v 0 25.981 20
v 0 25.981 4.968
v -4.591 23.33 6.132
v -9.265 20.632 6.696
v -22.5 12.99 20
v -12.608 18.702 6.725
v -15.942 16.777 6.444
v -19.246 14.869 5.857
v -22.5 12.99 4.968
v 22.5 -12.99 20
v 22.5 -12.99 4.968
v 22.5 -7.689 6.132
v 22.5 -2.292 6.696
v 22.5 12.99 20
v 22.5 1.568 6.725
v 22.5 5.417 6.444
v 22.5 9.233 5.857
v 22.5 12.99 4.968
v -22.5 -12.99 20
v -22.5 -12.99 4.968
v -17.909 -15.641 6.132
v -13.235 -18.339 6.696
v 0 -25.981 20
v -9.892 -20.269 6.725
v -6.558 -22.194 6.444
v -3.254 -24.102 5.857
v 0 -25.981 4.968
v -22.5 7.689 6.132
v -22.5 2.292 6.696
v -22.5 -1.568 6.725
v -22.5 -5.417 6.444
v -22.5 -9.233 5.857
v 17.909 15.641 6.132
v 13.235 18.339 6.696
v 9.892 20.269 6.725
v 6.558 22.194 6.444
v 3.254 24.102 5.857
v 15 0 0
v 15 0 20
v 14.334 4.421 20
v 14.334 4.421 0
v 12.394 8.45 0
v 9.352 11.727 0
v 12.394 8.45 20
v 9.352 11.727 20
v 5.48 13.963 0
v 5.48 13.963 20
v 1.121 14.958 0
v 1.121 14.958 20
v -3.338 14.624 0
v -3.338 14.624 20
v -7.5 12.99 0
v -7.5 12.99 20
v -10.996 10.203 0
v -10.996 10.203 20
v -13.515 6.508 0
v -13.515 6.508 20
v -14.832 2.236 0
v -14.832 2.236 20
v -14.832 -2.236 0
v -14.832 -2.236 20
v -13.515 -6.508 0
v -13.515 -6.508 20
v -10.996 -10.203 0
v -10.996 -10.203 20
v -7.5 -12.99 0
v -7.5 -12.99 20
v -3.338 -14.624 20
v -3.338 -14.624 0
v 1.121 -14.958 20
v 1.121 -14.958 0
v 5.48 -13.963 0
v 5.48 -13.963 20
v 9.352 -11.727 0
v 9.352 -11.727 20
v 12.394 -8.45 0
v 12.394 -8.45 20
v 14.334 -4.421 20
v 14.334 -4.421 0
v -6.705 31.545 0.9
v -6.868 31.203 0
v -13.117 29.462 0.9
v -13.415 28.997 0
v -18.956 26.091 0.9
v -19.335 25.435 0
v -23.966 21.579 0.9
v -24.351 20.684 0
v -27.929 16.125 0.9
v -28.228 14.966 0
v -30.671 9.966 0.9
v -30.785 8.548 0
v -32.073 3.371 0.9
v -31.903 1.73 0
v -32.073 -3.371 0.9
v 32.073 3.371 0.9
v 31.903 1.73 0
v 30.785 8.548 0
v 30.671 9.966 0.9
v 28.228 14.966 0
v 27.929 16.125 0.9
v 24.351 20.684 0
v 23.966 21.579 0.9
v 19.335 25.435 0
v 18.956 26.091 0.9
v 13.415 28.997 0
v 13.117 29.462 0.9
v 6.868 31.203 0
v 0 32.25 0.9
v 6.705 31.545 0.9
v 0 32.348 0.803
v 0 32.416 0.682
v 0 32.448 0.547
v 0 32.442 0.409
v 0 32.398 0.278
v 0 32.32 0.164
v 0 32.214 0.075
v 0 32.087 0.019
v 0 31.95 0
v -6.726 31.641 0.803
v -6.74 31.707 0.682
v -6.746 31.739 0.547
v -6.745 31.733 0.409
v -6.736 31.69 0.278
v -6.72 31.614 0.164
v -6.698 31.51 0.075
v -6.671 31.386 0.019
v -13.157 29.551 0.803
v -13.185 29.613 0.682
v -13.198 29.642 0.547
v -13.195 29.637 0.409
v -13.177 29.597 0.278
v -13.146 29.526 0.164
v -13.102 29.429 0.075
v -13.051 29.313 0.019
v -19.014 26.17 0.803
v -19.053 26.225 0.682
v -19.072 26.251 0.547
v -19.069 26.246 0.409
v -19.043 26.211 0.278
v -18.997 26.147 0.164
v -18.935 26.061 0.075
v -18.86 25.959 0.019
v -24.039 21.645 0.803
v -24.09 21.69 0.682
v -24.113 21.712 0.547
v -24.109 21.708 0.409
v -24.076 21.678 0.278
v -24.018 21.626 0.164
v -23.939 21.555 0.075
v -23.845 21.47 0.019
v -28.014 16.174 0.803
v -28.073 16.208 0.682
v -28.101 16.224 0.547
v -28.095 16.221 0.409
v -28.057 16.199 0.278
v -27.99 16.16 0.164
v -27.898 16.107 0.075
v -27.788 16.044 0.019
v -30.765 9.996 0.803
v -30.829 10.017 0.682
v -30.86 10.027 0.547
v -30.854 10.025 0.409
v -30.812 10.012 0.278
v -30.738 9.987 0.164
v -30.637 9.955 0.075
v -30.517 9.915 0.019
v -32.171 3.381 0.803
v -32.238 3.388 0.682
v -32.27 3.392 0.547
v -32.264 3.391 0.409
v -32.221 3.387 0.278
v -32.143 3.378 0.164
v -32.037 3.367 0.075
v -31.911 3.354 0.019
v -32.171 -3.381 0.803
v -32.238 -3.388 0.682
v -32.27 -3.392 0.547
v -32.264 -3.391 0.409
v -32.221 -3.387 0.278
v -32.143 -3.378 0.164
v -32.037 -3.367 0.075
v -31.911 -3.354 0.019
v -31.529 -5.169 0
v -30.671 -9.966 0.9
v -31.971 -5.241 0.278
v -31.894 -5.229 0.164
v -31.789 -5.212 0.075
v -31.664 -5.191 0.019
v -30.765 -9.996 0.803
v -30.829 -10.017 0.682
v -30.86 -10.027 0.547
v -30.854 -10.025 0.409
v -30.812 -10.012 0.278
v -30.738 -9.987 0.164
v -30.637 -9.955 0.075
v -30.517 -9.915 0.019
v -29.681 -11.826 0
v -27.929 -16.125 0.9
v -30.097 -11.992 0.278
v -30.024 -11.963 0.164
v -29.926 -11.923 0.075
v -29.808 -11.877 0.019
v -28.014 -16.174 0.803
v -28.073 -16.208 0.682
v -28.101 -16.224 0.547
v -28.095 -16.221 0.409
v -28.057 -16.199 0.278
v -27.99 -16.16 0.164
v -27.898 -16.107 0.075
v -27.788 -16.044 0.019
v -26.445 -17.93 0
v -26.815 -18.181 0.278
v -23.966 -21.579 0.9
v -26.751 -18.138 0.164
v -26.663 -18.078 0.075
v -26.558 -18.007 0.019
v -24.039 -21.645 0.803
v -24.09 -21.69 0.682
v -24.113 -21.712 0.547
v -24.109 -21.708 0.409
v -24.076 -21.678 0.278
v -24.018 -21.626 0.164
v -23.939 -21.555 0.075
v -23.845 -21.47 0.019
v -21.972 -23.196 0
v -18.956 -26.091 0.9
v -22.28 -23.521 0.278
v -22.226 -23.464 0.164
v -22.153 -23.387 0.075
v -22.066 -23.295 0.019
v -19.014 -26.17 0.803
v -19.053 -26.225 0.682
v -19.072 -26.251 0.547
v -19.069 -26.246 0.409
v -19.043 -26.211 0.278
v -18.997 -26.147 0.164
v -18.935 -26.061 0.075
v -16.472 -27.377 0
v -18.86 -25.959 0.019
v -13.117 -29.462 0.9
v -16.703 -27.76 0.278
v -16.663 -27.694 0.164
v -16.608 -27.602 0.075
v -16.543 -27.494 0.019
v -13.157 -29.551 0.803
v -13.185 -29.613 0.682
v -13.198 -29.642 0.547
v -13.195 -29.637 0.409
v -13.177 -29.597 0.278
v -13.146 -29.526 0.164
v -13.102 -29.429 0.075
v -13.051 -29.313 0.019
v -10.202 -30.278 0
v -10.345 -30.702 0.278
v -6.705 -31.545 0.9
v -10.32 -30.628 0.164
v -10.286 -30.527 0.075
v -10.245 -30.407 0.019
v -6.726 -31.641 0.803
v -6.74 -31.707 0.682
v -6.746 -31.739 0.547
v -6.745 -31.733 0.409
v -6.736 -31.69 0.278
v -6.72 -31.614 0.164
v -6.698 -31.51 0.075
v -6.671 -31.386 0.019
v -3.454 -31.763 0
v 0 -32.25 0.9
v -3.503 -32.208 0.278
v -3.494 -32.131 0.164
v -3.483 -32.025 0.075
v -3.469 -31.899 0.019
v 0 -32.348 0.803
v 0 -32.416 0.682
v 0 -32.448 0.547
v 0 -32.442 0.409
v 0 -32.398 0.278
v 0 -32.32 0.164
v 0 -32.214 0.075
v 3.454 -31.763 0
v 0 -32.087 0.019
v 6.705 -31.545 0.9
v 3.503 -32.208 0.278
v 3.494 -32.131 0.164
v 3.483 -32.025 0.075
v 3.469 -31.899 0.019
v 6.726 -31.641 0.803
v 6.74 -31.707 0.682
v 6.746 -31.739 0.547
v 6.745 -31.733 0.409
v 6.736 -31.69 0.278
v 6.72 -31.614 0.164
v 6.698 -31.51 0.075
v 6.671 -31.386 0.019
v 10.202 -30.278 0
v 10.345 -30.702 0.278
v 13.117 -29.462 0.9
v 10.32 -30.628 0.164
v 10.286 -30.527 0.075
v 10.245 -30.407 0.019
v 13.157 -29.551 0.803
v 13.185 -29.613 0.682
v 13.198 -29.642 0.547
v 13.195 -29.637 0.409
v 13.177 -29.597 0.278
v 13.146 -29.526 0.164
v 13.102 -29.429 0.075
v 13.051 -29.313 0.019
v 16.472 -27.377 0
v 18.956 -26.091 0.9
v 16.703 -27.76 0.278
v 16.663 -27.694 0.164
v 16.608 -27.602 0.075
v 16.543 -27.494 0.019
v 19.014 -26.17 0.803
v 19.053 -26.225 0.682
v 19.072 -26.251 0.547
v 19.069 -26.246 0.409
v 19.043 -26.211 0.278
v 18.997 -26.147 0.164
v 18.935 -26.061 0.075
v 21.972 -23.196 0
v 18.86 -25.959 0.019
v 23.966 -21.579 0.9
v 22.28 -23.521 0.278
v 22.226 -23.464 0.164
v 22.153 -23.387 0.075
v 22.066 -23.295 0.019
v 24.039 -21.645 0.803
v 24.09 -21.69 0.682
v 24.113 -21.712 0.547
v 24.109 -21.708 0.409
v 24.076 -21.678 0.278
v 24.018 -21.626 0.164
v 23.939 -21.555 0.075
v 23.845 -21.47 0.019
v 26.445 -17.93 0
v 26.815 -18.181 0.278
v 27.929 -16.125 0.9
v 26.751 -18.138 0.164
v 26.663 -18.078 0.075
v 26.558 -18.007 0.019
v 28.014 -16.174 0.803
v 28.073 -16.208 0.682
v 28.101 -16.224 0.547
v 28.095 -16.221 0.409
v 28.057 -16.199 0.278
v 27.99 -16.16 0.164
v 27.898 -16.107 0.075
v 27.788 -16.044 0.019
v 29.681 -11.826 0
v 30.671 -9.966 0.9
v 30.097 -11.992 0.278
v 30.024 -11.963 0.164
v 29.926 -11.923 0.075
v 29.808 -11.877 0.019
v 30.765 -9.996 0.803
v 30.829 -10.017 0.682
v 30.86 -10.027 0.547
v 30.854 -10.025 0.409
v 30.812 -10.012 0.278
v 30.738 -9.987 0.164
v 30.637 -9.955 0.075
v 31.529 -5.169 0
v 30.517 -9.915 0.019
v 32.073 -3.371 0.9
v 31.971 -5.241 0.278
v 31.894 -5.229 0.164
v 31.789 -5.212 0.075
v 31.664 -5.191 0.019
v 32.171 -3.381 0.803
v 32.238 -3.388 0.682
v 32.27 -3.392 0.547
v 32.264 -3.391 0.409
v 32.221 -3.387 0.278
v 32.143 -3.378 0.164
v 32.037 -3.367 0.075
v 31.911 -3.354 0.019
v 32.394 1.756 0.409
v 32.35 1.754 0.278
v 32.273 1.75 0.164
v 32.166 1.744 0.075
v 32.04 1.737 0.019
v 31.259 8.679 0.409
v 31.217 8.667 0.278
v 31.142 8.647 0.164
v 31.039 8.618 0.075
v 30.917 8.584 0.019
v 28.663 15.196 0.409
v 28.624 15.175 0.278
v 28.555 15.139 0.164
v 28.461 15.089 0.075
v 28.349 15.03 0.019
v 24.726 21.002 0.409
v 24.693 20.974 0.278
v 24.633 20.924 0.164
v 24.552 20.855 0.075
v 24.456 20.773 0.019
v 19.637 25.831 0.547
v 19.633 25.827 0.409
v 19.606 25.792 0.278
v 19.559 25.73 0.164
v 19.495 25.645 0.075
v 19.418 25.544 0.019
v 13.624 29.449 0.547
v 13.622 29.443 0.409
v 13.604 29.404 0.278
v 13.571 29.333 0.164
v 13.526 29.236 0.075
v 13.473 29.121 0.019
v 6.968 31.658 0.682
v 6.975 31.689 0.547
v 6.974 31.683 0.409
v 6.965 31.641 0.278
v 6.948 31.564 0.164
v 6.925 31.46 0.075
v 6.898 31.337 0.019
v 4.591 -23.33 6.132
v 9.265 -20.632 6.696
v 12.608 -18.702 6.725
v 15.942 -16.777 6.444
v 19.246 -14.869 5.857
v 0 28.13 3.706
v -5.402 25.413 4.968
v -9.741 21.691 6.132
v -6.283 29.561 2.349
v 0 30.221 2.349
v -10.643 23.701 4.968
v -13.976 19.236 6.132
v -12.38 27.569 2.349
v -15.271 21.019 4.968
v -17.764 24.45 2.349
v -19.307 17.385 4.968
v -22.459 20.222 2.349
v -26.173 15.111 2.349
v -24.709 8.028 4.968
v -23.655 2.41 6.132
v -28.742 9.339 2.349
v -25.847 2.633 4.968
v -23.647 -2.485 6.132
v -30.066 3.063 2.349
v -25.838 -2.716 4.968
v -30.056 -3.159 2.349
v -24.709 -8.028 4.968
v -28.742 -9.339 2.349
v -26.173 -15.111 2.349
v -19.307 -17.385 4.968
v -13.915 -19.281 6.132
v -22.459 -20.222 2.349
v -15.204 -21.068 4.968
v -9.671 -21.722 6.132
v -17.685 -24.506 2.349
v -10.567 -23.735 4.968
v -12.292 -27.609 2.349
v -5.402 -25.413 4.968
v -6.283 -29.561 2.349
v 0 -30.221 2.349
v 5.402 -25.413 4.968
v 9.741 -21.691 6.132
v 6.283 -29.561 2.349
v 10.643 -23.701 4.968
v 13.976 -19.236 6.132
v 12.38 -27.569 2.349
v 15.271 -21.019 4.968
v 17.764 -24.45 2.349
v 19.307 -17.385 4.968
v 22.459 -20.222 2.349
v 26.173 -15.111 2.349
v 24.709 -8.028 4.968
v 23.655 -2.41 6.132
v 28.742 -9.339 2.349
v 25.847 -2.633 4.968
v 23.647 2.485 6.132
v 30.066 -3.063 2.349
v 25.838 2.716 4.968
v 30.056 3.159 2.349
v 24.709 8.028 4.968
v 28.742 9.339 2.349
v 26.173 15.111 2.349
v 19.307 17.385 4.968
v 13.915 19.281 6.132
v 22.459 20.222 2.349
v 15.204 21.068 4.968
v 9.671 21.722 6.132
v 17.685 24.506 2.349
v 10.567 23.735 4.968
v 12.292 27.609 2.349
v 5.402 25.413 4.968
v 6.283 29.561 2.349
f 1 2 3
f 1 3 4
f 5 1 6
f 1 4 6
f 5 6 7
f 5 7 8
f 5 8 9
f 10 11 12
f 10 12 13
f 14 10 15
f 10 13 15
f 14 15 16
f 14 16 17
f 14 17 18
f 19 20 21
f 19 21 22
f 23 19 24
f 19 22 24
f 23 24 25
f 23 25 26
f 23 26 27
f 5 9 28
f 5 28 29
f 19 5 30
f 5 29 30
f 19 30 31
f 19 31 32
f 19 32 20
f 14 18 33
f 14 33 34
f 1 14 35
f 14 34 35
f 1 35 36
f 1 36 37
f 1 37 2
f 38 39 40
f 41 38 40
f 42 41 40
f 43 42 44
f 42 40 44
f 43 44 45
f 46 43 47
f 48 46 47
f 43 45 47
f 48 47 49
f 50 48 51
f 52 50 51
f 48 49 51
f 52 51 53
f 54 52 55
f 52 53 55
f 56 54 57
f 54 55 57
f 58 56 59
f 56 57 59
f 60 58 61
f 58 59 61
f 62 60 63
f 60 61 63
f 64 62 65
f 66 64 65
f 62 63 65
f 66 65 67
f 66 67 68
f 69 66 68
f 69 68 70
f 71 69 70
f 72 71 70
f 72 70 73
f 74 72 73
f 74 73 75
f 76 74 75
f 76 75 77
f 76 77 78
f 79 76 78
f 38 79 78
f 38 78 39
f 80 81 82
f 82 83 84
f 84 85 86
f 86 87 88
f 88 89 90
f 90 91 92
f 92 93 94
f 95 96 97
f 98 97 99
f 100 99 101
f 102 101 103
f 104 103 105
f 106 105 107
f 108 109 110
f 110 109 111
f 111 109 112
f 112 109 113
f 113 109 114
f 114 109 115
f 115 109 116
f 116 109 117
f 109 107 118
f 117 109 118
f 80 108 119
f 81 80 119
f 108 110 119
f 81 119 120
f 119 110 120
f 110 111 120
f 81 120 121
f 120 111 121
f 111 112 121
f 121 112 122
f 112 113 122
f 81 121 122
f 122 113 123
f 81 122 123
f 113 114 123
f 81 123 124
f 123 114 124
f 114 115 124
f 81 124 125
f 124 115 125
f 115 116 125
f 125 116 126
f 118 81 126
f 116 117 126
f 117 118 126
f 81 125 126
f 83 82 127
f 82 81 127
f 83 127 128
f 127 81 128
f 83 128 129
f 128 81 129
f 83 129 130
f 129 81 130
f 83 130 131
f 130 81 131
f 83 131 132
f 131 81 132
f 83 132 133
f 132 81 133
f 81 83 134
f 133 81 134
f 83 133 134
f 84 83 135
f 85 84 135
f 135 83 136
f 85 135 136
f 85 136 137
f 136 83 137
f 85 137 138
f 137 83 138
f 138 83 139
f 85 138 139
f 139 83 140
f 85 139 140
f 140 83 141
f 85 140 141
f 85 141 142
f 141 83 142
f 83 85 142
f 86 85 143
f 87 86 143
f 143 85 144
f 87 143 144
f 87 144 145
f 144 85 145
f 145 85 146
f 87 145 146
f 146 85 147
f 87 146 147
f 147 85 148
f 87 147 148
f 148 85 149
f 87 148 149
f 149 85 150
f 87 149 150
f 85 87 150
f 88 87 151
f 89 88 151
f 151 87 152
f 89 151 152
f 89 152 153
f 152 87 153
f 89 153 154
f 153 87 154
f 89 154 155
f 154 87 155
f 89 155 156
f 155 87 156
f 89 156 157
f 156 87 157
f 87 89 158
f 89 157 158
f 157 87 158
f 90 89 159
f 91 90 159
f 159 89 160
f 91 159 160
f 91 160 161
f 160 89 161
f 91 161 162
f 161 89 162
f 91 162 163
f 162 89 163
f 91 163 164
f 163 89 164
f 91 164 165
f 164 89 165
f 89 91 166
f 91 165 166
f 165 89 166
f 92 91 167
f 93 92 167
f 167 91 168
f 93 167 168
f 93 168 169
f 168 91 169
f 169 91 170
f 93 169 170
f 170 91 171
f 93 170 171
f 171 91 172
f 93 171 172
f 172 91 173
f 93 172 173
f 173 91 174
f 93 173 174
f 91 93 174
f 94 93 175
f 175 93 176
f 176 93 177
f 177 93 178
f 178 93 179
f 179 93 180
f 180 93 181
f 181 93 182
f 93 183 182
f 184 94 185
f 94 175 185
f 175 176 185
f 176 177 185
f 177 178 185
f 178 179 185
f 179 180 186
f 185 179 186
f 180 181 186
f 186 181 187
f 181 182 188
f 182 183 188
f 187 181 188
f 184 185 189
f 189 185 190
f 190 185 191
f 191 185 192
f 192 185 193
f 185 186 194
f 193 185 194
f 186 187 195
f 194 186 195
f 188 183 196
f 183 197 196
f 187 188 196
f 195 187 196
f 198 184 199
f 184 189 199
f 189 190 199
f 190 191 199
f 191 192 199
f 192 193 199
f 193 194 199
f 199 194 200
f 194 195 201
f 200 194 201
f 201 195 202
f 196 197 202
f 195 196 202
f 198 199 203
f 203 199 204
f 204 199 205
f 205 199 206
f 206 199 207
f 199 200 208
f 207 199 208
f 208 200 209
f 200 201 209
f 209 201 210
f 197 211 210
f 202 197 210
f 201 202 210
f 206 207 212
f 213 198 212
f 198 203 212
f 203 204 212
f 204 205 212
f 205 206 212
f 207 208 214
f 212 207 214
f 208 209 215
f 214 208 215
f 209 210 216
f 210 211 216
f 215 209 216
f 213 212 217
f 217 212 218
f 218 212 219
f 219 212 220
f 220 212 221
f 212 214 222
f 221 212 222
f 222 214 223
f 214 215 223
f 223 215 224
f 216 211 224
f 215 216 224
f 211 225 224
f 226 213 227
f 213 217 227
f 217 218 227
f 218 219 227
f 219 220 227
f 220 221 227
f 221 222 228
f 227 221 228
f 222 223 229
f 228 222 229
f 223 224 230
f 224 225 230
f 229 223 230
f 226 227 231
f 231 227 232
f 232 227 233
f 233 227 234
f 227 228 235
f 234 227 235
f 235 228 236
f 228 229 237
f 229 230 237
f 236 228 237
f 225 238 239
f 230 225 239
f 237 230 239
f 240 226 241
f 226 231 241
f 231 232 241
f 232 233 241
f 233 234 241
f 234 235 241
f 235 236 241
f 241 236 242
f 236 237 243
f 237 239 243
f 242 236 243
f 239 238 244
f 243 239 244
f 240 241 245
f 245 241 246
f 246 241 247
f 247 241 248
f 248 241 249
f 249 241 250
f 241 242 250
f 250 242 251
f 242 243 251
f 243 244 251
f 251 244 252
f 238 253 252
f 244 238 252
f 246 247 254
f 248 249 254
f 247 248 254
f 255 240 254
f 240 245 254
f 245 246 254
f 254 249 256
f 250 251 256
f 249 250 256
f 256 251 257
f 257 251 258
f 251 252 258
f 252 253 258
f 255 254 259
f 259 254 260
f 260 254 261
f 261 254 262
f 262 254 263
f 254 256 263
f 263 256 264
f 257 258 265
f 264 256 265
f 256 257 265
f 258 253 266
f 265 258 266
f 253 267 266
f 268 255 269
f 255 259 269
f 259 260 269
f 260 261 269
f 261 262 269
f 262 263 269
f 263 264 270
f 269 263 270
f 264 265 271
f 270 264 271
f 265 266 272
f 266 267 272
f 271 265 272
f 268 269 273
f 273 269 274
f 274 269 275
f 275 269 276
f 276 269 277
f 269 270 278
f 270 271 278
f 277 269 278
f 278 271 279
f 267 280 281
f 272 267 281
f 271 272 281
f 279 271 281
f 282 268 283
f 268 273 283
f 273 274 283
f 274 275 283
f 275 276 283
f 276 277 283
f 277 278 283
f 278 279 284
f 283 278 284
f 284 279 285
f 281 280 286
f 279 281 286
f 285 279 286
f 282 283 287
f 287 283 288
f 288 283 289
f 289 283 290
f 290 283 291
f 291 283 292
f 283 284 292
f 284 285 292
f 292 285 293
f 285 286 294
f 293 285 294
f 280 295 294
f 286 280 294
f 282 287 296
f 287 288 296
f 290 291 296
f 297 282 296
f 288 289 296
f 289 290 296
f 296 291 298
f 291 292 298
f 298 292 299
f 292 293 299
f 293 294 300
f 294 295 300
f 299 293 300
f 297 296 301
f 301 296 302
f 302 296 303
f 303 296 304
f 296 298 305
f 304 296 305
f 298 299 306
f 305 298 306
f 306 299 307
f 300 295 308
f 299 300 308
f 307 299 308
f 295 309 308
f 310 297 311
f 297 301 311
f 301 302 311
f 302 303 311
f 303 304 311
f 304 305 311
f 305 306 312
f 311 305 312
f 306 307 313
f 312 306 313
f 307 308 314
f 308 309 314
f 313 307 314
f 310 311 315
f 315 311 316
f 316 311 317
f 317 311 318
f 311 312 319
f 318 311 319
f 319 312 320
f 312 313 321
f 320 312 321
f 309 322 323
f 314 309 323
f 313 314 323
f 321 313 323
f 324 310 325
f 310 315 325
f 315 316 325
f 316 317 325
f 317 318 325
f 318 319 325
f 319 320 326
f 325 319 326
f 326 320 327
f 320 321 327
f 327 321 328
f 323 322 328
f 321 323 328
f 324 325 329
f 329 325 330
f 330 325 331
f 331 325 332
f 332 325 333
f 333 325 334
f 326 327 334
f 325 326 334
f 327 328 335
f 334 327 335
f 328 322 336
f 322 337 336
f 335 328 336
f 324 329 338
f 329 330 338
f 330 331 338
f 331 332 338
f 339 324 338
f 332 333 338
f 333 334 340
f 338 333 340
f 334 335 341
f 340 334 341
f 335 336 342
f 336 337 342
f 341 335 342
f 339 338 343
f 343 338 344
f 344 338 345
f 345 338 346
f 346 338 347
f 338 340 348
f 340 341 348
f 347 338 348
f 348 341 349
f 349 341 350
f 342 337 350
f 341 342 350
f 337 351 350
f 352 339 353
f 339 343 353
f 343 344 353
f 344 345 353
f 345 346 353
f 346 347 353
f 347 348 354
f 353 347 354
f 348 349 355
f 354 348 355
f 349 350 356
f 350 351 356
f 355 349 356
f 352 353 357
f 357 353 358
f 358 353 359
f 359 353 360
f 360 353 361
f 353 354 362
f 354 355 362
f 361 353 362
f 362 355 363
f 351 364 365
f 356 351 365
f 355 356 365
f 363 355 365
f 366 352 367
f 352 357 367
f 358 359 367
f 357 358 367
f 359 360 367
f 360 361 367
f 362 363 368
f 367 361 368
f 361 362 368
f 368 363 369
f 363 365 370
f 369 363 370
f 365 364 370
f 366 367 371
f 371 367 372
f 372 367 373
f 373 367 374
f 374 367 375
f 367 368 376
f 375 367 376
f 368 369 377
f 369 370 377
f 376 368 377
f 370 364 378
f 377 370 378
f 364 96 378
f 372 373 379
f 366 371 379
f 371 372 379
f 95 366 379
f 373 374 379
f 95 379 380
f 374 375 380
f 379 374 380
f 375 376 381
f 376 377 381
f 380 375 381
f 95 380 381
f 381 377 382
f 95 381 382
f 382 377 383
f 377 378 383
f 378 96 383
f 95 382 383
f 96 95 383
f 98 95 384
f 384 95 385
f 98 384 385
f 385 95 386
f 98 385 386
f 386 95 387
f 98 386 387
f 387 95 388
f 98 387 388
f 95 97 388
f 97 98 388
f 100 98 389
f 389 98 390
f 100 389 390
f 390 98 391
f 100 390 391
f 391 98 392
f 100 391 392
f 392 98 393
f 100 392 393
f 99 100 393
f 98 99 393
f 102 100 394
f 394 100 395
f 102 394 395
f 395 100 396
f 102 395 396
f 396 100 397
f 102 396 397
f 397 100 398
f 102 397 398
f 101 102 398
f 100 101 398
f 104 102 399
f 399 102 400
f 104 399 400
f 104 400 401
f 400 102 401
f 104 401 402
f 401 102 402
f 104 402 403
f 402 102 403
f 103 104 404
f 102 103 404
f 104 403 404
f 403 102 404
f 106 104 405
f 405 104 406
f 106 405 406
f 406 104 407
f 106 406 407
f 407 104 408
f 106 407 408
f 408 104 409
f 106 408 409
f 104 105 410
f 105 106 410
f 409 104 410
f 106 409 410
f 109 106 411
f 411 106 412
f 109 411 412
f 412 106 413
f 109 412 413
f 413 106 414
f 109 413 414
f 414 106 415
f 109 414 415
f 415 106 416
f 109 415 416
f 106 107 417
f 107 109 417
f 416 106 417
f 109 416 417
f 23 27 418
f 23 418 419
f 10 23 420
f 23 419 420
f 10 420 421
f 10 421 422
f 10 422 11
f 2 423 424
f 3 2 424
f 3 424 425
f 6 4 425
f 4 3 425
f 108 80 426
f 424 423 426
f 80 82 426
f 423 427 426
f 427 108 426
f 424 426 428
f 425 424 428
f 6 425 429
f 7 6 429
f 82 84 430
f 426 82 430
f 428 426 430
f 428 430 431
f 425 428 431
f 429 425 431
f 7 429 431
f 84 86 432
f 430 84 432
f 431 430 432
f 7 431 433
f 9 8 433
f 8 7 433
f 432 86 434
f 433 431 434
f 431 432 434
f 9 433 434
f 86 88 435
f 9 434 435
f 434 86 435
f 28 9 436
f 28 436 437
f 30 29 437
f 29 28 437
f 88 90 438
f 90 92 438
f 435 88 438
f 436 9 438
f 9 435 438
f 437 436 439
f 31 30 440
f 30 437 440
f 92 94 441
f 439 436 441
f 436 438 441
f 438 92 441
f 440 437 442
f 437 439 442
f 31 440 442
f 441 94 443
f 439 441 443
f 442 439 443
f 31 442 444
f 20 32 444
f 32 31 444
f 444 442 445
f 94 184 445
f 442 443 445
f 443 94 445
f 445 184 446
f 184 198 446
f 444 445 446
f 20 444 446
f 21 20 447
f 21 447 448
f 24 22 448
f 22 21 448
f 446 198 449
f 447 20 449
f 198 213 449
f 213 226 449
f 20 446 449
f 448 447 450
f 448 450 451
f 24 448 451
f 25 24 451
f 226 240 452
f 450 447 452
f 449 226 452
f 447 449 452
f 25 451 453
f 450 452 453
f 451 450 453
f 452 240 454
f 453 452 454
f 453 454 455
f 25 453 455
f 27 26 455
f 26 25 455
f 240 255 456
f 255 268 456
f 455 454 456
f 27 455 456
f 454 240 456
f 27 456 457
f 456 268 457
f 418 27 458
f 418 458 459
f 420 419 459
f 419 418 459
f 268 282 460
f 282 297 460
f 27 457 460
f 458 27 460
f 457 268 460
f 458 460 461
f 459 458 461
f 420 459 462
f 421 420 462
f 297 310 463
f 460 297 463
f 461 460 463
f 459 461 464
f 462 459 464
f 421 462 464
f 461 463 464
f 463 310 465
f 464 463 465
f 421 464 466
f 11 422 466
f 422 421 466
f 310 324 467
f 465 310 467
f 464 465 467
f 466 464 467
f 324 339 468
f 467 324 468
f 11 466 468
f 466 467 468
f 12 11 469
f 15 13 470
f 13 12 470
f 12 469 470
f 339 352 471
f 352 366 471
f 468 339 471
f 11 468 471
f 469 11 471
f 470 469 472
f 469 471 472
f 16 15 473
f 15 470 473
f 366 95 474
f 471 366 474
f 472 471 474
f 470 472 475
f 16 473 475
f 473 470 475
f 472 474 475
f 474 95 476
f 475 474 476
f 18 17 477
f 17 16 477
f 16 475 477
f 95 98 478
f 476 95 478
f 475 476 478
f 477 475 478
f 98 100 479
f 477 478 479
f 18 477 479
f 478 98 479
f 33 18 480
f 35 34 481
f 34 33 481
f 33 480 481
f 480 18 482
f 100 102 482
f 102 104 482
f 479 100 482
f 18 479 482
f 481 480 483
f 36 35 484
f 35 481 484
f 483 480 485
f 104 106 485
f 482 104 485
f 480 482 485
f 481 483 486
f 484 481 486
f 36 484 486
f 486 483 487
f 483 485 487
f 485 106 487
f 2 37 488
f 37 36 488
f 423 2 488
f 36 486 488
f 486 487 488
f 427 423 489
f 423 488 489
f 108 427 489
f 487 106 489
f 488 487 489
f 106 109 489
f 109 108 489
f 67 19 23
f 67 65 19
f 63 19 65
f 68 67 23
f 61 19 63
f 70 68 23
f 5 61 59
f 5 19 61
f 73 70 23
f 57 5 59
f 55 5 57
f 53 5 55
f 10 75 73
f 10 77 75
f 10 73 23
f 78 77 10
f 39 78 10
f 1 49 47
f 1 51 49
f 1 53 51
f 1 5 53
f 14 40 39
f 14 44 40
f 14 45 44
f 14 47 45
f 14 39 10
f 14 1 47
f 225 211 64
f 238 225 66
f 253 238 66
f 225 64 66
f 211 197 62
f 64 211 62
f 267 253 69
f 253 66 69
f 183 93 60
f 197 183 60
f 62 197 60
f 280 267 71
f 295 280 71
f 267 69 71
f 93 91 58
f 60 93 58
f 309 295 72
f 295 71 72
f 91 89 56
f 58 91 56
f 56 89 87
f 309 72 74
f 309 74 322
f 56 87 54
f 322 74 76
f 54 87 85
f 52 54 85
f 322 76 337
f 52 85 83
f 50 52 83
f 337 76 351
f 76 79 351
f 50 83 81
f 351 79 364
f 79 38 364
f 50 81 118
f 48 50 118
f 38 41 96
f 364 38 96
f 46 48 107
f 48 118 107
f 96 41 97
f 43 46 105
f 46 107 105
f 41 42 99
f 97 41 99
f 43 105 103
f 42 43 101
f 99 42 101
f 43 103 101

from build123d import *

# Parameters (mm, degrees)
BOSS_EXTRUDE2_DEPTH = 20
SKETCH3_R           = 15
CUT_EXTRUDE1_DEPTH  = 51.060014113


with BuildPart() as part:
    # Sketch1 → Boss-Extrude2 (new body)
    with BuildSketch(Plane.XY):
        Polygon((22.5, 12.990381057), (0, 25.980762114), (-22.5, 12.990381057), (-22.5, -12.990381057), (0, -25.980762114), (22.5, -12.990381057), align=None)
    extrude(amount=BOSS_EXTRUDE2_DEPTH)

    # Sketch2 → Revolve1 (revolve)
    with BuildSketch(Plane(origin=(0, 0, 0), x_dir=(0, 0, -1), z_dir=(1, 0, 0)), mode=Mode.PRIVATE) as revolve1_sk:
        with BuildLine():
            Line((0, 0), (-12, 0))
            ThreePointArc((-12, 0), (-8.979840166, -16.995527234), (-0.900236414, -32.249684523))
            ThreePointArc((-0.900236414, -32.249684523), (-0.342073129, -32.424403945), (0, -31.95))
            Line((0, -31.95), (0, 0))
        make_face()
    revolve(revolve1_sk.sketch.rotate(Axis((0, 0, 0), (0, 0, 1)), 180), axis=Axis((0, 0, 0), (0, 0, 1)))

    # Sketch3 → Cut-Extrude1 (cut, through all)
    with BuildSketch(Plane.XY.offset(20)):
        Circle(SKETCH3_R)
    extrude(amount=-CUT_EXTRUDE1_DEPTH, mode=Mode.SUBTRACT)


solid = part.part
